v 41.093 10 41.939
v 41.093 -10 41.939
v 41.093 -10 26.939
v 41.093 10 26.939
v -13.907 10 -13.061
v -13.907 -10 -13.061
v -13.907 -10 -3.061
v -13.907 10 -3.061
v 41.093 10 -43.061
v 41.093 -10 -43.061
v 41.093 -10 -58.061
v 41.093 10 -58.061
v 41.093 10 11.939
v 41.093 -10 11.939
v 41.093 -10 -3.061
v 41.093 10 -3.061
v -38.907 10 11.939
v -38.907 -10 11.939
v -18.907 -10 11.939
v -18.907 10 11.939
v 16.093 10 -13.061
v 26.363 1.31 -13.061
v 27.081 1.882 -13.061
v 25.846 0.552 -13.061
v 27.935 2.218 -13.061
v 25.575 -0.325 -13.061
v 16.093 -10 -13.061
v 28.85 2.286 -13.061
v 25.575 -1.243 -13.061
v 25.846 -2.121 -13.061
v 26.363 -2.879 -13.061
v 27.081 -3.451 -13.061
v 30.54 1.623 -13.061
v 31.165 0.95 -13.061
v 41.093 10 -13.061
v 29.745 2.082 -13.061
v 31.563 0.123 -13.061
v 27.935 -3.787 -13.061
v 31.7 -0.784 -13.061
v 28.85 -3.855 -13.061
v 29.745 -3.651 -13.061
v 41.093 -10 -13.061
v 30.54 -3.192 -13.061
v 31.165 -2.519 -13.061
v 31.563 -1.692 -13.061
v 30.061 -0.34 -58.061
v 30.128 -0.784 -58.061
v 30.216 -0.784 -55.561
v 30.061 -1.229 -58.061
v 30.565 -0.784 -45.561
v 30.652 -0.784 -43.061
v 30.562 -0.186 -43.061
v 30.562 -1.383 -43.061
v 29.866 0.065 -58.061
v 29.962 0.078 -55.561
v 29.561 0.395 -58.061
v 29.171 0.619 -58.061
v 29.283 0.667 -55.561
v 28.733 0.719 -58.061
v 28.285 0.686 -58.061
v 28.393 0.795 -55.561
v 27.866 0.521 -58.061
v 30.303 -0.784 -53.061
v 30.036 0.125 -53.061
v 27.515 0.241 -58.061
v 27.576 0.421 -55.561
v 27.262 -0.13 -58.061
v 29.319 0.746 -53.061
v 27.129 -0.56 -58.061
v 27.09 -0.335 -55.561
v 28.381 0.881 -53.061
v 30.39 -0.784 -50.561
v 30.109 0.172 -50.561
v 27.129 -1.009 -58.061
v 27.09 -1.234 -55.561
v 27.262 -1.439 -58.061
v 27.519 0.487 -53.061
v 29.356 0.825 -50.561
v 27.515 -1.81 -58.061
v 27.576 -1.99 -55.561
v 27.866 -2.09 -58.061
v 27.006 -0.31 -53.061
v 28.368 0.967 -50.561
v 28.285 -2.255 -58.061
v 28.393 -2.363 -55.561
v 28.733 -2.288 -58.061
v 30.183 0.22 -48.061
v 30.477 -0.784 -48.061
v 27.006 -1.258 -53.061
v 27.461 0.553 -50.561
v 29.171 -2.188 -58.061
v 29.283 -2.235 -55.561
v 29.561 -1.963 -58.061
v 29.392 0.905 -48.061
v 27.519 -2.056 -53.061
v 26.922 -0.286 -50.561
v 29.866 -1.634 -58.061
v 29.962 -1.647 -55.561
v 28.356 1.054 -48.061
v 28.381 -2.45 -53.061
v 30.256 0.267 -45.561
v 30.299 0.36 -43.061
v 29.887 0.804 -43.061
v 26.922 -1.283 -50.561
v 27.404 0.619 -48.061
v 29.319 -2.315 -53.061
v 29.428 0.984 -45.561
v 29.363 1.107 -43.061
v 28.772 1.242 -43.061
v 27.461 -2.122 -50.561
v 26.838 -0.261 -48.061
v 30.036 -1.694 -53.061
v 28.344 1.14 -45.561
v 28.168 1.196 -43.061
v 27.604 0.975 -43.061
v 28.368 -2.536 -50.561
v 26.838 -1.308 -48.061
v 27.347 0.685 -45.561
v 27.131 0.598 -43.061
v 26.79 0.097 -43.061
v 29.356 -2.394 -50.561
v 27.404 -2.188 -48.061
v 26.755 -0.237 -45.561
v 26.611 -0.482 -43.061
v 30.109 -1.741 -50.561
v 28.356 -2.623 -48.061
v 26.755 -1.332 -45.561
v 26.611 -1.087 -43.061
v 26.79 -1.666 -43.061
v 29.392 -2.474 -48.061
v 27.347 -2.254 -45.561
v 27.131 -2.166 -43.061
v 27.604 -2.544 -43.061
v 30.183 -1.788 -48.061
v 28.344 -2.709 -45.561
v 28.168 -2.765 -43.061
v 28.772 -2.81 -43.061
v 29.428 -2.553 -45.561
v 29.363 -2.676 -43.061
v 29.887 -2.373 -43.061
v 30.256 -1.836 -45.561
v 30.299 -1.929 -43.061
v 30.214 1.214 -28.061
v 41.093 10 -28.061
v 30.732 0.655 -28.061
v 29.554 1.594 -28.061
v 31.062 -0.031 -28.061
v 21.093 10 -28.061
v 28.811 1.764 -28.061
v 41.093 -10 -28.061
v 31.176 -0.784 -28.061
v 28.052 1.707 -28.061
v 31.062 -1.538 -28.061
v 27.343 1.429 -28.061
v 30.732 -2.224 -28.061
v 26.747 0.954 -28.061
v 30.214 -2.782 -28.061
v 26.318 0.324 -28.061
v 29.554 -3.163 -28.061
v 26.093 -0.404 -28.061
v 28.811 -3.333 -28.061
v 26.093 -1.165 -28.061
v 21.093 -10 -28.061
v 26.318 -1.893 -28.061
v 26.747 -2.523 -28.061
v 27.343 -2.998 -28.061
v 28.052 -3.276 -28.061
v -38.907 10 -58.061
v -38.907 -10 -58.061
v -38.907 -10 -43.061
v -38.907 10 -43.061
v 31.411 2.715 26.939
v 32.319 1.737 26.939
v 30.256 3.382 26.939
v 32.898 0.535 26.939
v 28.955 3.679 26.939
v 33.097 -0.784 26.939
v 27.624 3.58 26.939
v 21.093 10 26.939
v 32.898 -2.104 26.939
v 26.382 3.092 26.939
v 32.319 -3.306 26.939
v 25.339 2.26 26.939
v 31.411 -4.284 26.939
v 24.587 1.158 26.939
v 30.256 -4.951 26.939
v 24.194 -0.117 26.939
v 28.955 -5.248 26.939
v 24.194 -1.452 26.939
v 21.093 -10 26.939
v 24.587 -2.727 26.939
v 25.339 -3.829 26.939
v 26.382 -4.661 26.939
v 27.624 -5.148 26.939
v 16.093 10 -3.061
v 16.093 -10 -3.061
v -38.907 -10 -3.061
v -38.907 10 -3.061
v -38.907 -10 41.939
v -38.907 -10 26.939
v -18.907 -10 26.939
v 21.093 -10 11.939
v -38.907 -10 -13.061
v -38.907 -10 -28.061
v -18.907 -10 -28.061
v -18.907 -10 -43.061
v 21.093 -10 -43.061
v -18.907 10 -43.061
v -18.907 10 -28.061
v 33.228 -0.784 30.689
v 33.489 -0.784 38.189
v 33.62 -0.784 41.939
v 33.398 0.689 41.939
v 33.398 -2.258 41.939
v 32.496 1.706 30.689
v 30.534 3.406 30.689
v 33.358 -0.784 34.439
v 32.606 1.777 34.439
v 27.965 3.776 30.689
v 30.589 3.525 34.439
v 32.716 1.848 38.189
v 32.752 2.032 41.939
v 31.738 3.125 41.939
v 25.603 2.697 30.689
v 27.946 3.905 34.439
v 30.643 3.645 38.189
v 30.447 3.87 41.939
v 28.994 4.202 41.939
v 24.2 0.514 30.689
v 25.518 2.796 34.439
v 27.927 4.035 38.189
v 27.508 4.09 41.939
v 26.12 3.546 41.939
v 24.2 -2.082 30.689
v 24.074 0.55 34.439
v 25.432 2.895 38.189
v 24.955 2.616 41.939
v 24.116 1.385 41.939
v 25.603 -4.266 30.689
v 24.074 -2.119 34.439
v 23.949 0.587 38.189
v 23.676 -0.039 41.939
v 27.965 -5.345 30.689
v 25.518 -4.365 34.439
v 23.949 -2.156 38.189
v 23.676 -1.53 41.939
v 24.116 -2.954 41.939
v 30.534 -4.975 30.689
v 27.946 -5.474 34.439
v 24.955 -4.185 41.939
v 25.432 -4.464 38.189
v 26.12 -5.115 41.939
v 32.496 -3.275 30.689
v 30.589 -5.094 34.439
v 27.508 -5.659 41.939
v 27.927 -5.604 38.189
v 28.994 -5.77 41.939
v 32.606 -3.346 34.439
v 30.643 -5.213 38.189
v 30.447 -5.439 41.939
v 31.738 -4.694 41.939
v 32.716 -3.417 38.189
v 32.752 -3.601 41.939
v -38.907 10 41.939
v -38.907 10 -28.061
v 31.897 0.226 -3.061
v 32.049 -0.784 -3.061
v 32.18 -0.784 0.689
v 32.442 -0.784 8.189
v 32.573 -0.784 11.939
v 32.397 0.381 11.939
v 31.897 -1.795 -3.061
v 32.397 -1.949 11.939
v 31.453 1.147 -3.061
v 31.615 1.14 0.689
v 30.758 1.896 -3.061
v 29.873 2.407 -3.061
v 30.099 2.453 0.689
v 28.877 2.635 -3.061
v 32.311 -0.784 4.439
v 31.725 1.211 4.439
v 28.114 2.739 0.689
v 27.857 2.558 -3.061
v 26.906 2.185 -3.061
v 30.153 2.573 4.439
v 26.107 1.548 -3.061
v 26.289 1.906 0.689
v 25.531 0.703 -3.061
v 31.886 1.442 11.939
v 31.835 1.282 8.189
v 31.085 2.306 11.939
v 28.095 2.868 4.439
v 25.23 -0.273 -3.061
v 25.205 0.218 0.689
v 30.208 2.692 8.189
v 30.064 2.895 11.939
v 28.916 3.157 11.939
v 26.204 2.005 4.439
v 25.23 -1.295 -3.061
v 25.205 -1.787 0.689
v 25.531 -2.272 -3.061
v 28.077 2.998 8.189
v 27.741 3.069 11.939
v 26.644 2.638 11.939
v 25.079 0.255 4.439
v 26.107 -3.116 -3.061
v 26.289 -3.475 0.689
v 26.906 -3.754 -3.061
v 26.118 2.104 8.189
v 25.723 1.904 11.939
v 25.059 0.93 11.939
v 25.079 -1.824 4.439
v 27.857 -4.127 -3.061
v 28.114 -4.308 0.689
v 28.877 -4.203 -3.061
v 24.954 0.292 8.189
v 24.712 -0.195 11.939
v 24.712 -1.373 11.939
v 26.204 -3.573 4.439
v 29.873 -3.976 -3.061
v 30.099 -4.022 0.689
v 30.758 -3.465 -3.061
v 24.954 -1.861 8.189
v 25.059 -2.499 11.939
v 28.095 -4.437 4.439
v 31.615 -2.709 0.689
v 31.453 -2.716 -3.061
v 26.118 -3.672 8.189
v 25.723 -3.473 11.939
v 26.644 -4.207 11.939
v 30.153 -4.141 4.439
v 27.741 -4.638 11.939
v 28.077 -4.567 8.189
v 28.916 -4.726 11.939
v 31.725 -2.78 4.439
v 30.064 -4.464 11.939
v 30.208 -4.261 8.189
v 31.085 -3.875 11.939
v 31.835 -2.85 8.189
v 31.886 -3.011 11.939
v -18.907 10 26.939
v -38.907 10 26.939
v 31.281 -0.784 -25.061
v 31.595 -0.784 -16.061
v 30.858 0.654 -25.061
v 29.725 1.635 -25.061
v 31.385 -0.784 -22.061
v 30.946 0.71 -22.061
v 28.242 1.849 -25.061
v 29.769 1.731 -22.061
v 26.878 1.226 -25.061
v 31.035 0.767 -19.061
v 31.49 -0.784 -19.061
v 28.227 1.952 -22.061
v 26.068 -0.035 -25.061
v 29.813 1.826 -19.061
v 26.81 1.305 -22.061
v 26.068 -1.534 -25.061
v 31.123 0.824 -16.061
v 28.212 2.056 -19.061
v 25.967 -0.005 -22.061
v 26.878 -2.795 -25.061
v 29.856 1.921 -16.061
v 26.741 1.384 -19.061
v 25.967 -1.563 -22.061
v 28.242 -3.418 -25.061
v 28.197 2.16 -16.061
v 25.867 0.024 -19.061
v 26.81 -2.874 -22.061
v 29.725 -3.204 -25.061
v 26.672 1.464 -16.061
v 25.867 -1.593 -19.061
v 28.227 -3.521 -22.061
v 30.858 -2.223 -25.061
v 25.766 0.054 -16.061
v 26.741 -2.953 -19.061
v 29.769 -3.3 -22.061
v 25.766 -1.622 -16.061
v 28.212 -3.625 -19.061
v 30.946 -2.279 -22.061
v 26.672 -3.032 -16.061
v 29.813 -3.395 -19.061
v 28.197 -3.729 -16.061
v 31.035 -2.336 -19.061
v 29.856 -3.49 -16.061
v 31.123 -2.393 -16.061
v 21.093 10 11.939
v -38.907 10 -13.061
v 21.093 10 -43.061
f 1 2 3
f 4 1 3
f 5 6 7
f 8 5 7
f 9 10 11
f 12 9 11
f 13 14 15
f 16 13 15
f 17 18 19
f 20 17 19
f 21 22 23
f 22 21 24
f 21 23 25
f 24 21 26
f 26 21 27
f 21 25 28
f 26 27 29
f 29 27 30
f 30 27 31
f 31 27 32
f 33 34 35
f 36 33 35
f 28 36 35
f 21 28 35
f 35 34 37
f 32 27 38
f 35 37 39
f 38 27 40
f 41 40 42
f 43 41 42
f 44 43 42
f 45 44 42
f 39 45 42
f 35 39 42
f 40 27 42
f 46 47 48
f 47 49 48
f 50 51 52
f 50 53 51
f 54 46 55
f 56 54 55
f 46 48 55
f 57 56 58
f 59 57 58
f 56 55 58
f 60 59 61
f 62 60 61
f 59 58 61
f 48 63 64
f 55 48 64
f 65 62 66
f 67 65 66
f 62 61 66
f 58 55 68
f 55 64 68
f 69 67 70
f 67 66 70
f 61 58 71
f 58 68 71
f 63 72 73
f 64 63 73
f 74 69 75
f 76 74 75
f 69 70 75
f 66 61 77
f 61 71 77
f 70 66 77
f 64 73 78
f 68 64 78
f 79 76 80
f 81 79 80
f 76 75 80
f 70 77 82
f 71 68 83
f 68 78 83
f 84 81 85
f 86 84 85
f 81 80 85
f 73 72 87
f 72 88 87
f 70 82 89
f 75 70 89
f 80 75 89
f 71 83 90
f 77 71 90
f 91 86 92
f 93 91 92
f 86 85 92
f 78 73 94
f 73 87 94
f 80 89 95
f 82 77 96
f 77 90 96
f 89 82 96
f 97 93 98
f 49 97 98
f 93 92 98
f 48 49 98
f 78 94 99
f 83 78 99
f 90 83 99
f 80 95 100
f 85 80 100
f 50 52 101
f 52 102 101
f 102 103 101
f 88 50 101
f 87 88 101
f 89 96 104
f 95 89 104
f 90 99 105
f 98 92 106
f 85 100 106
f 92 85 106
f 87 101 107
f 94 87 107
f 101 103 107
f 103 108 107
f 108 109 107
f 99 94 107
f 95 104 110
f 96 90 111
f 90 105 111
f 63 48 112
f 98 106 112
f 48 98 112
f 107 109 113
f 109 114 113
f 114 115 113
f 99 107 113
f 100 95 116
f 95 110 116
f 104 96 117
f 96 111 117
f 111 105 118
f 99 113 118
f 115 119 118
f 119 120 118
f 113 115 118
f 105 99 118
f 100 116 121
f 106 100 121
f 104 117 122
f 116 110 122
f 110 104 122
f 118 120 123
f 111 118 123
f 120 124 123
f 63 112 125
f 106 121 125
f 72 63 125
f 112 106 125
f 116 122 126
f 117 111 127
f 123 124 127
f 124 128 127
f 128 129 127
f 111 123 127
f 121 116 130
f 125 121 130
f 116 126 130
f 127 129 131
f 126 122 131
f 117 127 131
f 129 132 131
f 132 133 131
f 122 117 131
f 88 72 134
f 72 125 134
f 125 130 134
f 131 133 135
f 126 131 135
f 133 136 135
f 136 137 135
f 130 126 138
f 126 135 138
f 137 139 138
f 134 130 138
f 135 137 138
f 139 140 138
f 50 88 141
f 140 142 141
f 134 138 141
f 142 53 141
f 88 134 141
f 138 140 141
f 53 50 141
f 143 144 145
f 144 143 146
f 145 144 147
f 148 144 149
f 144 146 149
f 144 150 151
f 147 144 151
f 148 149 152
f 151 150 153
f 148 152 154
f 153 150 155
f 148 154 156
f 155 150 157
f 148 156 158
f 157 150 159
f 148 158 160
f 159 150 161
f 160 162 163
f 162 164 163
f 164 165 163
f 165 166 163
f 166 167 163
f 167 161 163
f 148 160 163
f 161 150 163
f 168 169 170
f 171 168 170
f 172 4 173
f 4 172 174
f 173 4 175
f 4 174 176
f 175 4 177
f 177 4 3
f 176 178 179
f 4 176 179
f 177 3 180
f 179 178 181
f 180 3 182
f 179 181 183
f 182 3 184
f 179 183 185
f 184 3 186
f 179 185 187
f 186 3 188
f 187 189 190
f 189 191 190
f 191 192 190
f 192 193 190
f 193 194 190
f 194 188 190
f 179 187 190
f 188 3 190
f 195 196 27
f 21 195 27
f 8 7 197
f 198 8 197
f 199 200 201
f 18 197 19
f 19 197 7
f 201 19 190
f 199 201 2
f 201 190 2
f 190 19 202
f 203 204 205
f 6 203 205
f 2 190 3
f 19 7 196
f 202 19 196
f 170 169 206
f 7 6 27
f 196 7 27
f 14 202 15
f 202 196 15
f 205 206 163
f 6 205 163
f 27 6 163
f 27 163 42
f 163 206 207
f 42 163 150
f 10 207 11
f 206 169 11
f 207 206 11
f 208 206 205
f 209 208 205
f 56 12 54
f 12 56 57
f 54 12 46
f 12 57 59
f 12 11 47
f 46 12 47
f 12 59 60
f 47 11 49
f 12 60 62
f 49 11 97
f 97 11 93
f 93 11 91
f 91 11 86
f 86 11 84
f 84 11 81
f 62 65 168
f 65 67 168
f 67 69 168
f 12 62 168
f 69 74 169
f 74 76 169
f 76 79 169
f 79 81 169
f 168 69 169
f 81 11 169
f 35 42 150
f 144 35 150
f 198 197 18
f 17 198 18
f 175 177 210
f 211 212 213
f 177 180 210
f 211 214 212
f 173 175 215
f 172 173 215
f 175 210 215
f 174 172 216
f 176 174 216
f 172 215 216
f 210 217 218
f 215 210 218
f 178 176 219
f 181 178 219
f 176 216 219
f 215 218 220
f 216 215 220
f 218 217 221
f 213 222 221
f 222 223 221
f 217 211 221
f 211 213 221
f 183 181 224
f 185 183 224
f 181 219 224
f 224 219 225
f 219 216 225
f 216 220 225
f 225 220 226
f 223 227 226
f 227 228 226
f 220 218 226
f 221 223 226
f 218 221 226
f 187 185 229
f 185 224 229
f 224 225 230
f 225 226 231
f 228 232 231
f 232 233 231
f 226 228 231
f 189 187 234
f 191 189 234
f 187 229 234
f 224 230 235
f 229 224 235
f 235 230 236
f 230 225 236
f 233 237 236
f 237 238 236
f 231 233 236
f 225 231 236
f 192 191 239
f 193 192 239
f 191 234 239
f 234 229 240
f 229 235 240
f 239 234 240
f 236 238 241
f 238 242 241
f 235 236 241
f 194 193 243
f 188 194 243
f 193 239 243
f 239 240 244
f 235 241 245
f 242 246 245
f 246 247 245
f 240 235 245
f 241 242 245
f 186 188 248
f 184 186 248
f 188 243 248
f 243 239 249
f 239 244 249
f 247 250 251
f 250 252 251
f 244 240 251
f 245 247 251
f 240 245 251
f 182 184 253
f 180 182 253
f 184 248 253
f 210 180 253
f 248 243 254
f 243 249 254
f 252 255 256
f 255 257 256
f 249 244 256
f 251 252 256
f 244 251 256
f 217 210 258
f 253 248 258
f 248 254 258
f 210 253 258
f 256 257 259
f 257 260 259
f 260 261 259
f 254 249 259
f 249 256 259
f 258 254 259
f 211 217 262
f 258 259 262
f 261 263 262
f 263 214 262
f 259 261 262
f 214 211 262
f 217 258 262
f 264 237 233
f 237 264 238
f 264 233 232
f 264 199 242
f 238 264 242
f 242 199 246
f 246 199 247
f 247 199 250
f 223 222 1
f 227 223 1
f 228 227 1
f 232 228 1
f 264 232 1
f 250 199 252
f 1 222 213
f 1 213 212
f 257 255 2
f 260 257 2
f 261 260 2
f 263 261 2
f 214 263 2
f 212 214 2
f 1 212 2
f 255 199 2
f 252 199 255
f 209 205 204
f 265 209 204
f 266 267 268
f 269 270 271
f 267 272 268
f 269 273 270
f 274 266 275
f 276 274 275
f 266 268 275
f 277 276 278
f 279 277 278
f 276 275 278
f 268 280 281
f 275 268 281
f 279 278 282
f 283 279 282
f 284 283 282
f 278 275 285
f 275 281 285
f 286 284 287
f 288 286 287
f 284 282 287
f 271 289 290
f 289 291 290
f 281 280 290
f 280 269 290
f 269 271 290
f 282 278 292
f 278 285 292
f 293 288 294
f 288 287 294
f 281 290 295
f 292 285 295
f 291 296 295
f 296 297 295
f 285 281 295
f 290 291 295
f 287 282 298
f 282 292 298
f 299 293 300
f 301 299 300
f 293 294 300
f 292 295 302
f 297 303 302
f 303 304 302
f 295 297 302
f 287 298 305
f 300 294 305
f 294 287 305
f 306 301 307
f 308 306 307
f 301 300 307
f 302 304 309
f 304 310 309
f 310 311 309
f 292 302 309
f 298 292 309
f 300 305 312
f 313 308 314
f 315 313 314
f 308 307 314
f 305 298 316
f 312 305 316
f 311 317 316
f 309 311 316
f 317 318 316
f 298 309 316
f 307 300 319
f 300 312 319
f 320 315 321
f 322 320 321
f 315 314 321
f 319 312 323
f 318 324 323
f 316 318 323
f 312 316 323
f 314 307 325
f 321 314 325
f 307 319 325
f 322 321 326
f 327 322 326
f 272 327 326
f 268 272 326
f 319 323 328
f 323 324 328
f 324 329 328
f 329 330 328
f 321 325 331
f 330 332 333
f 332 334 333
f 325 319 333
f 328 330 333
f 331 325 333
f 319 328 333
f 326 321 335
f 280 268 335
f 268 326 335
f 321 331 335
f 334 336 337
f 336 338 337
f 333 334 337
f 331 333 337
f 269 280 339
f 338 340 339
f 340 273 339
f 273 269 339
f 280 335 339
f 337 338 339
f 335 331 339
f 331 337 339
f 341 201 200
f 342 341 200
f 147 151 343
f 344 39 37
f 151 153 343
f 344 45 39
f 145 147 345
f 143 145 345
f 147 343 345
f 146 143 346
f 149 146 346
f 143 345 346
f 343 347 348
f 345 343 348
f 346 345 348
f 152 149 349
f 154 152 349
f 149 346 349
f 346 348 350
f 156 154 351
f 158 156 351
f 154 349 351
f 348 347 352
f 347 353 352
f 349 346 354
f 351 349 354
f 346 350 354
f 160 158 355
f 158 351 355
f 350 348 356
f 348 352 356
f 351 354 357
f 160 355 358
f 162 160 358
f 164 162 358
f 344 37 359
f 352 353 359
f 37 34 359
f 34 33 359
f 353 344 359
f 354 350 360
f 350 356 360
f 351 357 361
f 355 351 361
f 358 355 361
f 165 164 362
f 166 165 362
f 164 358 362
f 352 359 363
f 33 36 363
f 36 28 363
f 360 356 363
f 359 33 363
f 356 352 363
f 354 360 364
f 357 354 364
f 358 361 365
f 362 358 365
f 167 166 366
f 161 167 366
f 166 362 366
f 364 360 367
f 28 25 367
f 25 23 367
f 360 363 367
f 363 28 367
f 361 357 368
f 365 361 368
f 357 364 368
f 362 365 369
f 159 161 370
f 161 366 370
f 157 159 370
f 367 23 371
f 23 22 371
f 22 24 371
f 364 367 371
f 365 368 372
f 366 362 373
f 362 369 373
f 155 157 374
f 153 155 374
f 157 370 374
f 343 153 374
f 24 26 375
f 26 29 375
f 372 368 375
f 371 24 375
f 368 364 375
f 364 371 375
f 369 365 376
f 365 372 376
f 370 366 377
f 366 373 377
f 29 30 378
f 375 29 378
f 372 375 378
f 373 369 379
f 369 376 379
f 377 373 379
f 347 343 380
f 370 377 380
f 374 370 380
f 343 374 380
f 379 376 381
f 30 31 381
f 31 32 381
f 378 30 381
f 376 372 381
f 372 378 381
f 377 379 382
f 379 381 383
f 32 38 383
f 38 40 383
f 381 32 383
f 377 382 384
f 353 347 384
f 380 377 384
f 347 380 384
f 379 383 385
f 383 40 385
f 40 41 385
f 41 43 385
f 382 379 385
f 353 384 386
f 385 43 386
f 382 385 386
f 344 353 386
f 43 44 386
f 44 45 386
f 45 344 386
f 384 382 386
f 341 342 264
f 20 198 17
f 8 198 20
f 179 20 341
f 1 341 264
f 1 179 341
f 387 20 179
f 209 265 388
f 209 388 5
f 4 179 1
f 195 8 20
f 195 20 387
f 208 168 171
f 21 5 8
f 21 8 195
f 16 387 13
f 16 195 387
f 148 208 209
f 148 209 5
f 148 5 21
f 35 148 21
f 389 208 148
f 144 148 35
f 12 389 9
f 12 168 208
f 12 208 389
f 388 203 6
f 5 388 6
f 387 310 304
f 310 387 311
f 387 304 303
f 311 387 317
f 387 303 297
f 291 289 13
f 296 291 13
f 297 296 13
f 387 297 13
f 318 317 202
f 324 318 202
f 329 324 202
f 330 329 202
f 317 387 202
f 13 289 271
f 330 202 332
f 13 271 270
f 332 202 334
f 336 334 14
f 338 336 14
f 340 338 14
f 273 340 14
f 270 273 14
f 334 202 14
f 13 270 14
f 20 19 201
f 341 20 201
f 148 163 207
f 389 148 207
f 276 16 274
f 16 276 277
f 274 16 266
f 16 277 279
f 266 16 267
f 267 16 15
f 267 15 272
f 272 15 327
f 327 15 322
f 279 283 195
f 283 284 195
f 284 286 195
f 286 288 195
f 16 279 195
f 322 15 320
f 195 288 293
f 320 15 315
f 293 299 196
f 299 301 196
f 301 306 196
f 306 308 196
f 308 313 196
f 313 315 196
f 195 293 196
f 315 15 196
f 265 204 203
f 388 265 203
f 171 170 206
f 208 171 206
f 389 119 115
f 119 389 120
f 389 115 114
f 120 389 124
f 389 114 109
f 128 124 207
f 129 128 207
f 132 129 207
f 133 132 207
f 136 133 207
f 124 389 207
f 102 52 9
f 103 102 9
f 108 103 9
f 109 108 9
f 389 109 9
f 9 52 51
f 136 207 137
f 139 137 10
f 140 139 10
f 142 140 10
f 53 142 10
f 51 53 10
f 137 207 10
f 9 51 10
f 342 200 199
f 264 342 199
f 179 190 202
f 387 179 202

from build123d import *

# Parameters (mm, degrees)
BOSS_EXTRUDE1_DEPTH      = 10
BOSS_EXTRUDE1_DEPTH_BACK = 10


# Read off the part's stored shape, not the designer's step: Hole1
with BuildPart() as part:
    # Sketch1 → Boss-Extrude1 (new, two sides: drawn at the far end of the back side and taken through both)
    with BuildSketch(Plane(origin=(0, 0, 0), x_dir=(1, 0, 0), z_dir=(0, 1, 0)).offset(-BOSS_EXTRUDE1_DEPTH_BACK)):
        Polygon((41.092590889, 58.060996062), (-38.907409111, 58.060996062), (-38.907409111, 43.060996062), (-18.907409111, 43.060996062), (-18.907409111, 28.060996062), (-38.907409111, 28.060996062), (-38.907409111, 13.060996062), (-13.907409111, 13.060996062), (-13.907409111, 3.060996062), (-38.907409111, 3.060996062), (-38.907409111, -11.939003938), (-18.907409111, -11.939003938), (-18.907409111, -26.939003938), (-38.907409111, -26.939003938), (-38.907409111, -41.939003938), (41.092590889, -41.939003938), (41.092590889, -26.939003938), (21.092590889, -26.939003938), (21.092590889, -11.939003938), (41.092590889, -11.939003938), (41.092590889, 3.060996062), (16.092590889, 3.060996062), (16.092590889, 13.060996062), (41.092590889, 13.060996062), (41.092590889, 28.060996062), (21.092590889, 28.060996062), (21.092590889, 43.060996062), (41.092590889, 43.060996062), align=None)
    extrude(amount=BOSS_EXTRUDE1_DEPTH + BOSS_EXTRUDE1_DEPTH_BACK)

    # Hole1 outline → Hole1 (revolve, cut)
    with BuildSketch(Plane(origin=(28.620361889, -0.784426919, 0), x_dir=(1, 0, 0), z_dir=(0, -1, 0))):
        Polygon((5, 41.939003938), (0, 41.939003938), (0, 26.939003938), (4.476188458, 26.939003938), align=None)
        Polygon((3.428565373, -3.060996062), (3.952376915, 11.939003938), (0, 11.939003938), (0, -3.060996062), align=None)
        Polygon((2.555546136, -28.060996062), (3.079357678, -13.060996062), (0, -13.060996062), (0, -28.060996062), align=None)
        Polygon((1.507923051, -58.060996062), (2.031734593, -43.060996062), (0, -43.060996062), (0, -58.060996062), align=None)
    revolve(axis=Axis((28.620361889, -0.784426919, 0), (0, 0, 1)), mode=Mode.SUBTRACT)


solid = part.part
